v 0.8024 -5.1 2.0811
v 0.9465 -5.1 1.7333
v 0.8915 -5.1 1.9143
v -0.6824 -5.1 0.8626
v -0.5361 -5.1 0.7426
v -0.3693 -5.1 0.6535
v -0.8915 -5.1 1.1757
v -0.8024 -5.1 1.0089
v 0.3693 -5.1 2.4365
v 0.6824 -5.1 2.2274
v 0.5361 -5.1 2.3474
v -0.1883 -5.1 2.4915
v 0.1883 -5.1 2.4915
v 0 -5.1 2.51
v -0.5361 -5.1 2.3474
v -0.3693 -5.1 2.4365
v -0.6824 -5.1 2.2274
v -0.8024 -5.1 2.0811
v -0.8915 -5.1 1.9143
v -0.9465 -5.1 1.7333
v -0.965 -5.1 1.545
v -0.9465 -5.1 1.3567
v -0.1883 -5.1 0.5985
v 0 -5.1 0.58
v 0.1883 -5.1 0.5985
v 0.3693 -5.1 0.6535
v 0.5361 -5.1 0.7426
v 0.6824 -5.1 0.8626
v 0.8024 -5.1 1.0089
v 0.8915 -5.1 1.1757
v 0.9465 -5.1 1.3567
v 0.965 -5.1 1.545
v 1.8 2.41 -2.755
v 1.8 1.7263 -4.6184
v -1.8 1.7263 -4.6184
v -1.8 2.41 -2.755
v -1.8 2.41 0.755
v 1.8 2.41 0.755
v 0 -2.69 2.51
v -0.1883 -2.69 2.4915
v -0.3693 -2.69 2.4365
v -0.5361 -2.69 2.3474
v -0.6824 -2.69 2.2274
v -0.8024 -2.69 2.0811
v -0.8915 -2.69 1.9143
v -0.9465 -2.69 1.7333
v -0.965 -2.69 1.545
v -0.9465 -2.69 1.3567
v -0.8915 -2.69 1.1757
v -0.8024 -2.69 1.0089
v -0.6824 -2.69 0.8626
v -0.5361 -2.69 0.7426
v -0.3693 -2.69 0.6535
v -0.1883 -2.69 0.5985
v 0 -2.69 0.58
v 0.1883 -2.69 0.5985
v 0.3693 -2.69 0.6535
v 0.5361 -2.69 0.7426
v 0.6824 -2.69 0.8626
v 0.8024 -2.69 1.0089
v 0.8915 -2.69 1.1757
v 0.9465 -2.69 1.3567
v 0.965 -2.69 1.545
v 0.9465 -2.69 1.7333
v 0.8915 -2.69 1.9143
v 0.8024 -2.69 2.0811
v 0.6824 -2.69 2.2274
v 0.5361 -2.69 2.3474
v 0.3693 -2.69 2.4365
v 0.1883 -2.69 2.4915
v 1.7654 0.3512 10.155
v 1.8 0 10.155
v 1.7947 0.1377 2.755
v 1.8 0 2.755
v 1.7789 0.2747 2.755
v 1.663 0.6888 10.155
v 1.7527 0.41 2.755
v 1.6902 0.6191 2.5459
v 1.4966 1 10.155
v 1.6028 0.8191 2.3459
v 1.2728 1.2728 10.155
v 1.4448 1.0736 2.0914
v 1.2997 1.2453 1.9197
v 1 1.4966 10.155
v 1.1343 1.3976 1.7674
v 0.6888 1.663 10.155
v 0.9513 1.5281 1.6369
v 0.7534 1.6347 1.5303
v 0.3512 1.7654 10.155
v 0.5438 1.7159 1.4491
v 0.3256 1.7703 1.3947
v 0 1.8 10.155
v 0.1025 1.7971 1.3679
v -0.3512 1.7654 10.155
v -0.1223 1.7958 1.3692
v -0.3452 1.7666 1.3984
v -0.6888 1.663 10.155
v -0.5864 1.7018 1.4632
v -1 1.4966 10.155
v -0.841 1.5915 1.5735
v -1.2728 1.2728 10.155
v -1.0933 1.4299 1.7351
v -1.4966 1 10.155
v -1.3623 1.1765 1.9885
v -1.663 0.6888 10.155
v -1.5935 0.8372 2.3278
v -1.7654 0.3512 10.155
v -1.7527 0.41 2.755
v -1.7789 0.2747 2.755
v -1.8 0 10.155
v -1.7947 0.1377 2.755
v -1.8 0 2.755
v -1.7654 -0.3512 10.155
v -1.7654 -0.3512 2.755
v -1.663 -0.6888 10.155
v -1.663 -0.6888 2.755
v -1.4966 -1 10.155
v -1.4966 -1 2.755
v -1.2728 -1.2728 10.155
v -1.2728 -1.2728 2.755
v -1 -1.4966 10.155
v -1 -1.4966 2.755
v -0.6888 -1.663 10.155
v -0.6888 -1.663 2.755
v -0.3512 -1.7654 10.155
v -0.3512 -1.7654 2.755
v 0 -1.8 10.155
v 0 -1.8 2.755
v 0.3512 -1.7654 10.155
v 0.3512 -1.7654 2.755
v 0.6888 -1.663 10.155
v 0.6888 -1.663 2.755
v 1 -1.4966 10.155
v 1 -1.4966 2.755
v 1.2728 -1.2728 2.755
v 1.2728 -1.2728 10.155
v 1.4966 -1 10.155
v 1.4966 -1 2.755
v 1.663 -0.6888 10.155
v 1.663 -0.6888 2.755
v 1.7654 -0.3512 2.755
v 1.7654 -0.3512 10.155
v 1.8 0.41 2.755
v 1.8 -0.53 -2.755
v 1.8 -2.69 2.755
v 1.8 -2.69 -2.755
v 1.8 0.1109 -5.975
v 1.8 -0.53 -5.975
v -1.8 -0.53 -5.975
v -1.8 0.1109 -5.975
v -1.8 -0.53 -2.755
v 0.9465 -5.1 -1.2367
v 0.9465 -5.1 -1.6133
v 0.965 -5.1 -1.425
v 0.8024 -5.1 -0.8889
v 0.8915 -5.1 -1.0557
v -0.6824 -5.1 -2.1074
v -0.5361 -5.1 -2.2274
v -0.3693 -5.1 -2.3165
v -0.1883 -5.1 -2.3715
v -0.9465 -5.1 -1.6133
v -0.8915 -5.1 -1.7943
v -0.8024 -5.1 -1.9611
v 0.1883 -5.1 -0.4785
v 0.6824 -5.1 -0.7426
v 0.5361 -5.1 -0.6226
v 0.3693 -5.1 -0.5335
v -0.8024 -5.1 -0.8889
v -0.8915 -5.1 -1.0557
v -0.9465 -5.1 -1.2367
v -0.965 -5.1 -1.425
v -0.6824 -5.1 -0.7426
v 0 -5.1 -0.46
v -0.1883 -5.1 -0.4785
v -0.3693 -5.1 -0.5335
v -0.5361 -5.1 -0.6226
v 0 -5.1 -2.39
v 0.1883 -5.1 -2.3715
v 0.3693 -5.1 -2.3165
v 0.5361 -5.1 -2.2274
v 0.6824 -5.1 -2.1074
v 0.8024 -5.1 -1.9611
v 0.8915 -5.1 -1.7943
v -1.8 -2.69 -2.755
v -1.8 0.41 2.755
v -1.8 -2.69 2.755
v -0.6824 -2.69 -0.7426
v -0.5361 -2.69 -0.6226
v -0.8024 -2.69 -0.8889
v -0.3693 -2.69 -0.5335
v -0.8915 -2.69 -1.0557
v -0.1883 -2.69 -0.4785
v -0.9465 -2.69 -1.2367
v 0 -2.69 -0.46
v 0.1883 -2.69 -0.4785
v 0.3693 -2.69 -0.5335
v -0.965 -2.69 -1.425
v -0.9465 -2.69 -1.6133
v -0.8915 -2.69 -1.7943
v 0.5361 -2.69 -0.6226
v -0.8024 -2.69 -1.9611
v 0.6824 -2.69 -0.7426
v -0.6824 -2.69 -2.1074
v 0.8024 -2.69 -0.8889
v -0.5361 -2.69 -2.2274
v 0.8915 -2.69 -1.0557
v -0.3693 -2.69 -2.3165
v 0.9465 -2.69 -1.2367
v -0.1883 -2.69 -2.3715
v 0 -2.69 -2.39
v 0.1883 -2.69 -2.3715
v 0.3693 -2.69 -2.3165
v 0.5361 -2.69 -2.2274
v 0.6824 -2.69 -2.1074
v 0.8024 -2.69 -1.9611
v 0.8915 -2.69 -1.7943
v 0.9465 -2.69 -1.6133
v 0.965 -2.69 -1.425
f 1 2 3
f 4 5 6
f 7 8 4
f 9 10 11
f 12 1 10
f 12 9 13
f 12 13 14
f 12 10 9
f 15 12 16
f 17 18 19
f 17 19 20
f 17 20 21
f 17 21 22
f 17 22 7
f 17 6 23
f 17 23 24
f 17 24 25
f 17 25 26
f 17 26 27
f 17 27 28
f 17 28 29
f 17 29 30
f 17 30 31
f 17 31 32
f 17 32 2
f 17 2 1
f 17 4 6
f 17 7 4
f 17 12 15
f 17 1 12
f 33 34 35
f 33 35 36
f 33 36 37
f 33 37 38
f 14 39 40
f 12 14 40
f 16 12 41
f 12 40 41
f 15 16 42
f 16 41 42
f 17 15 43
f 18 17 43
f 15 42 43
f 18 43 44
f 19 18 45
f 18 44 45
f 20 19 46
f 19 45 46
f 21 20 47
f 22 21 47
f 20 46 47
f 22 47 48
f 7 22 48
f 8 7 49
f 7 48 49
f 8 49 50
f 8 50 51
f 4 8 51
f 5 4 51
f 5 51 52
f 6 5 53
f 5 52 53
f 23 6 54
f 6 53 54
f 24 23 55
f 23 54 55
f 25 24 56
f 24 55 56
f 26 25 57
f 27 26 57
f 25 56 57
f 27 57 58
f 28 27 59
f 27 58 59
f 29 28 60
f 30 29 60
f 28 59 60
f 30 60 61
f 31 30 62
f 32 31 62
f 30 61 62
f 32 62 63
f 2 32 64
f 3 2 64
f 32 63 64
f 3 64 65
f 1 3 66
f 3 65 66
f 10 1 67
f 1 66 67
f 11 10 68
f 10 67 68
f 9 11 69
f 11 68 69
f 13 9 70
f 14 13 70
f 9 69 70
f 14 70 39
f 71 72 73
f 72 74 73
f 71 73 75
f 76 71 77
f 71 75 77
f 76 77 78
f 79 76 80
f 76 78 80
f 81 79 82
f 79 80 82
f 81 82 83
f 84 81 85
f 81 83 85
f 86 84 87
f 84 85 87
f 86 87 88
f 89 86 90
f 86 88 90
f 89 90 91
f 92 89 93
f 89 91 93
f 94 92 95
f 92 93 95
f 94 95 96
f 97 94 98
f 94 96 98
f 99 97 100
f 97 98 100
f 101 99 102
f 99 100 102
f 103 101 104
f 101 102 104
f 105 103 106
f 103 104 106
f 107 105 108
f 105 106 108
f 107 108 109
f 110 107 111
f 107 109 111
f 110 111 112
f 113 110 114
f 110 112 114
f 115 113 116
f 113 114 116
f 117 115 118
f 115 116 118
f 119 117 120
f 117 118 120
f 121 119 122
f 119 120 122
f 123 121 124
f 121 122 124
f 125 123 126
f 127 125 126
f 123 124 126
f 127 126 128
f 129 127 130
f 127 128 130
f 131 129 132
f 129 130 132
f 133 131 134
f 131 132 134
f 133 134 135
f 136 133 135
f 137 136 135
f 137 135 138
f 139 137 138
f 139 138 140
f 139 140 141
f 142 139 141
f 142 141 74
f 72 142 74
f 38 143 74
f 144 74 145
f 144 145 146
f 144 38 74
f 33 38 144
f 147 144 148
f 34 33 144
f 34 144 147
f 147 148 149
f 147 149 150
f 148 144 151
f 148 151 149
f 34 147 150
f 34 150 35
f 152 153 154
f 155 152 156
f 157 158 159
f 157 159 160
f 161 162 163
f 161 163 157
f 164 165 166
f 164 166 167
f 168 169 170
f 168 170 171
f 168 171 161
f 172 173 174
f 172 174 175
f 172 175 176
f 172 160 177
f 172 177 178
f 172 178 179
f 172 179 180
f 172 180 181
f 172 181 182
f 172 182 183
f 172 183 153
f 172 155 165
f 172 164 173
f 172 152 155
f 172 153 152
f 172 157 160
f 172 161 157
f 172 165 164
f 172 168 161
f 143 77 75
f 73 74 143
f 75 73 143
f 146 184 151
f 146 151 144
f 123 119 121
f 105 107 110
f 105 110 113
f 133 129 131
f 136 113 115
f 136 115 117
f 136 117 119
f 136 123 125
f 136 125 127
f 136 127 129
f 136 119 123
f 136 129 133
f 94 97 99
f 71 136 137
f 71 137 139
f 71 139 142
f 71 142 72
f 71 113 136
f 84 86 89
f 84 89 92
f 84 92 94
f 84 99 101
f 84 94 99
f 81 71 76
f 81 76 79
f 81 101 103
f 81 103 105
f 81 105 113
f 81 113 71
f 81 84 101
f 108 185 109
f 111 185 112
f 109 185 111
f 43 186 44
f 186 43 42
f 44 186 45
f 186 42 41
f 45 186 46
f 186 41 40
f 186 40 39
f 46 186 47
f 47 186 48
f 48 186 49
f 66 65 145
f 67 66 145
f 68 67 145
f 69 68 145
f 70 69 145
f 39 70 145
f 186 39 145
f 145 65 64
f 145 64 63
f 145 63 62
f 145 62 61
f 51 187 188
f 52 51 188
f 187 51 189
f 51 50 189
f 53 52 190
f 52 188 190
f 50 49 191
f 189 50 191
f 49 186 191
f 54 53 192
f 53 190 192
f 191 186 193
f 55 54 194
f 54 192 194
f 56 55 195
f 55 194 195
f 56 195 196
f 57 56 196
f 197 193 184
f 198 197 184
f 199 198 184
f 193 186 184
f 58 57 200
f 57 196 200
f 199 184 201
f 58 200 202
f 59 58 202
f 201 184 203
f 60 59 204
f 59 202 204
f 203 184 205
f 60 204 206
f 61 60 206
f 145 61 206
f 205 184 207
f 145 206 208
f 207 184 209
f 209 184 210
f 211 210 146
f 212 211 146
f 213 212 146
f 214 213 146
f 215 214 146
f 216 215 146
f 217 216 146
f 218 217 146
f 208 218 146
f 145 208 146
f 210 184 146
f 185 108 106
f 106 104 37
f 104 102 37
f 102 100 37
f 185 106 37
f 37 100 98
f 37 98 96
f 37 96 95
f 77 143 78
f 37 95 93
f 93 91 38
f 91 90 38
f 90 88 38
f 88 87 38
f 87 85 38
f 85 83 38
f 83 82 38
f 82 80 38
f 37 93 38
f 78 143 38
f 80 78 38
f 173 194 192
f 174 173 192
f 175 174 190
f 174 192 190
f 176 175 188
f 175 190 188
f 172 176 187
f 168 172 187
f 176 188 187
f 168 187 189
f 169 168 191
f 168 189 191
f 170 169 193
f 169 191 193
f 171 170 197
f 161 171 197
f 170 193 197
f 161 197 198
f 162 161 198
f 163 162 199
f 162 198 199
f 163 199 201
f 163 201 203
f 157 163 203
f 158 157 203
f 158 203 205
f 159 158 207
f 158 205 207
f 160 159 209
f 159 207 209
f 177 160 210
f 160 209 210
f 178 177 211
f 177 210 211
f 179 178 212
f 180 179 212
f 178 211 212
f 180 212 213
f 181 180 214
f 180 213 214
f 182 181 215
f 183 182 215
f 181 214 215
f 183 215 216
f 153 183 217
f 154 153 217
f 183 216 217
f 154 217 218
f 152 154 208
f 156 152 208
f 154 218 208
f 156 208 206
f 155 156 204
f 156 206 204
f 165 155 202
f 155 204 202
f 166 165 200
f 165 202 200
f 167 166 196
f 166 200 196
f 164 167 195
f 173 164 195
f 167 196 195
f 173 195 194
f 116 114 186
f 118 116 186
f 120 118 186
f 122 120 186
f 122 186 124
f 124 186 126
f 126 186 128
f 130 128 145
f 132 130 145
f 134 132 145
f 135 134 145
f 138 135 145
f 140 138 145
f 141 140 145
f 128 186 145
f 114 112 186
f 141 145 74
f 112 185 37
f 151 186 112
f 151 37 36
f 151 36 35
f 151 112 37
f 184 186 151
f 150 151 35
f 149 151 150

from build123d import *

# Parameters (mm, degrees)
BOSS_EXTRUDE1_DEPTH             = 2.41
BOSS_EXTRUDE1_DEPTH_BACK        = 2.69
SKETCH1_W                       = 3.6
SKETCH1_H                       = 5.51
SKETCH2_R                       = 1.8
BOSS_EXTRUDE2_DEPTH             = 7.4
SKETCH3_R                       = 0.965
BOSS_EXTRUDE3_DEPTH             = 2.41
BOSS_EXTRUDE4_REACH             = 13.505
BOSS_EXTRUDE4_DIRECTION_2_REACH = 13.505
CHAMFER1_SIZE                   = 2


with BuildPart() as part:
    # Sketch1 → Boss-Extrude1 (new, two sides: drawn at the far end of the back side and taken through both)
    with BuildSketch(Plane(origin=(0, 0, 0), x_dir=(1, 0, 0), z_dir=(0, 1, 0)).offset(-BOSS_EXTRUDE1_DEPTH_BACK)):
        Rectangle(SKETCH1_W, SKETCH1_H)
    extrude(amount=BOSS_EXTRUDE1_DEPTH + BOSS_EXTRUDE1_DEPTH_BACK)

    # Sketch2 → Boss-Extrude2 (add)
    with BuildSketch(Plane.XY.offset(2.755)):
        Circle(SKETCH2_R)
    extrude(amount=BOSS_EXTRUDE2_DEPTH)

    # Sketch3 → Boss-Extrude3 (add)
    with BuildSketch(Plane.XZ.offset(2.69)):
        with Locations(Location((0, 1.545, 0), (0, 0, 90))):
            Circle(SKETCH3_R)
        with Locations(Location((0, -1.425, 0), (0, 0, 90))):
            Circle(SKETCH3_R)
    extrude(amount=BOSS_EXTRUDE3_DEPTH)

    # Boss-Extrude4: up to this face of the body (flat: up to its plane)
    boss_extrude4_end = Plane(part.part.faces().sort_by_distance((1.8, -0.14, 0))[0])
    # Sketch4 → Boss-Extrude4 (add, up to the picked face)
    with BuildSketch(Plane(origin=(0, 0, 0), x_dir=(0, 0, -1), z_dir=(1, 0, 0)), mode=Mode.PRIVATE) as boss_extrude4_sk1:
        Polygon((2.755, -0.53), (5.975, -0.53), (5.975, 0.110868038), (4.618427758, 1.726276708), (2.755, 2.41), align=None)
    boss_extrude4_tool1 = split(extrude(boss_extrude4_sk1.sketch, amount=BOSS_EXTRUDE4_REACH, mode=Mode.PRIVATE), bisect_by=boss_extrude4_end, keep=Keep.BOTH, mode=Mode.PRIVATE)
    add(boss_extrude4_tool1.solids().sort_by(Axis((0, 0.630129, -4.086068), (1, 0, 0)))[0])

    # Boss-Extrude4 direction 2: up to this face of the body (flat: up to its plane)
    boss_extrude4_direction_2_end = Plane(part.part.faces().sort_by_distance((-1.8, -0.14, 0))[0])
    # Sketch4 → Boss-Extrude4 direction 2 (add, up to the picked face)
    with BuildSketch(Plane(origin=(0, 0, 0), x_dir=(0, 0, -1), z_dir=(1, 0, 0)), mode=Mode.PRIVATE) as boss_extrude4_direction_2_sk1:
        Polygon((2.755, -0.53), (5.975, -0.53), (5.975, 0.110868038), (4.618427758, 1.726276708), (2.755, 2.41), align=None)
    boss_extrude4_direction_2_tool1 = split(extrude(boss_extrude4_direction_2_sk1.sketch, amount=-BOSS_EXTRUDE4_DIRECTION_2_REACH, mode=Mode.PRIVATE), bisect_by=boss_extrude4_direction_2_end, keep=Keep.BOTH, mode=Mode.PRIVATE)
    add(boss_extrude4_direction_2_tool1.solids().sort_by(Axis((0, 0.630129, -4.086068), (-1, 0, 0)))[0])

    # Chamfer1
    # the kernel refuses this chamfer: 2 mm, written as the material it takes off along each edge
    with BuildSketch(Plane(origin=(6.943365976, 2.41, 2.755), x_dir=(0, -0.9996219169112968, 0.02749587661058627), z_dir=(-1, 0, 0))) as chamfer1_piece_1_section:
        Polygon((CHAMFER1_SIZE * 0.999621916911, -CHAMFER1_SIZE * 0.0274958766106), (-CHAMFER1_SIZE * 0.0274958766106, -CHAMFER1_SIZE * 0.999621916911), (0, 0), align=None)
    chamfer1_piece_1 = extrude(amount=13.886731952, mode=Mode.PRIVATE)
    chamfer1_piece_1 = chamfer1_piece_1 - Plane(origin=(0, 0, 2.480910963), x_dir=(1, 0, 0), z_dir=(0, 0, -1)) * Cylinder(1.8, 36, mode=Mode.PRIVATE)
    add(chamfer1_piece_1, mode=Mode.SUBTRACT)


solid = part.part
